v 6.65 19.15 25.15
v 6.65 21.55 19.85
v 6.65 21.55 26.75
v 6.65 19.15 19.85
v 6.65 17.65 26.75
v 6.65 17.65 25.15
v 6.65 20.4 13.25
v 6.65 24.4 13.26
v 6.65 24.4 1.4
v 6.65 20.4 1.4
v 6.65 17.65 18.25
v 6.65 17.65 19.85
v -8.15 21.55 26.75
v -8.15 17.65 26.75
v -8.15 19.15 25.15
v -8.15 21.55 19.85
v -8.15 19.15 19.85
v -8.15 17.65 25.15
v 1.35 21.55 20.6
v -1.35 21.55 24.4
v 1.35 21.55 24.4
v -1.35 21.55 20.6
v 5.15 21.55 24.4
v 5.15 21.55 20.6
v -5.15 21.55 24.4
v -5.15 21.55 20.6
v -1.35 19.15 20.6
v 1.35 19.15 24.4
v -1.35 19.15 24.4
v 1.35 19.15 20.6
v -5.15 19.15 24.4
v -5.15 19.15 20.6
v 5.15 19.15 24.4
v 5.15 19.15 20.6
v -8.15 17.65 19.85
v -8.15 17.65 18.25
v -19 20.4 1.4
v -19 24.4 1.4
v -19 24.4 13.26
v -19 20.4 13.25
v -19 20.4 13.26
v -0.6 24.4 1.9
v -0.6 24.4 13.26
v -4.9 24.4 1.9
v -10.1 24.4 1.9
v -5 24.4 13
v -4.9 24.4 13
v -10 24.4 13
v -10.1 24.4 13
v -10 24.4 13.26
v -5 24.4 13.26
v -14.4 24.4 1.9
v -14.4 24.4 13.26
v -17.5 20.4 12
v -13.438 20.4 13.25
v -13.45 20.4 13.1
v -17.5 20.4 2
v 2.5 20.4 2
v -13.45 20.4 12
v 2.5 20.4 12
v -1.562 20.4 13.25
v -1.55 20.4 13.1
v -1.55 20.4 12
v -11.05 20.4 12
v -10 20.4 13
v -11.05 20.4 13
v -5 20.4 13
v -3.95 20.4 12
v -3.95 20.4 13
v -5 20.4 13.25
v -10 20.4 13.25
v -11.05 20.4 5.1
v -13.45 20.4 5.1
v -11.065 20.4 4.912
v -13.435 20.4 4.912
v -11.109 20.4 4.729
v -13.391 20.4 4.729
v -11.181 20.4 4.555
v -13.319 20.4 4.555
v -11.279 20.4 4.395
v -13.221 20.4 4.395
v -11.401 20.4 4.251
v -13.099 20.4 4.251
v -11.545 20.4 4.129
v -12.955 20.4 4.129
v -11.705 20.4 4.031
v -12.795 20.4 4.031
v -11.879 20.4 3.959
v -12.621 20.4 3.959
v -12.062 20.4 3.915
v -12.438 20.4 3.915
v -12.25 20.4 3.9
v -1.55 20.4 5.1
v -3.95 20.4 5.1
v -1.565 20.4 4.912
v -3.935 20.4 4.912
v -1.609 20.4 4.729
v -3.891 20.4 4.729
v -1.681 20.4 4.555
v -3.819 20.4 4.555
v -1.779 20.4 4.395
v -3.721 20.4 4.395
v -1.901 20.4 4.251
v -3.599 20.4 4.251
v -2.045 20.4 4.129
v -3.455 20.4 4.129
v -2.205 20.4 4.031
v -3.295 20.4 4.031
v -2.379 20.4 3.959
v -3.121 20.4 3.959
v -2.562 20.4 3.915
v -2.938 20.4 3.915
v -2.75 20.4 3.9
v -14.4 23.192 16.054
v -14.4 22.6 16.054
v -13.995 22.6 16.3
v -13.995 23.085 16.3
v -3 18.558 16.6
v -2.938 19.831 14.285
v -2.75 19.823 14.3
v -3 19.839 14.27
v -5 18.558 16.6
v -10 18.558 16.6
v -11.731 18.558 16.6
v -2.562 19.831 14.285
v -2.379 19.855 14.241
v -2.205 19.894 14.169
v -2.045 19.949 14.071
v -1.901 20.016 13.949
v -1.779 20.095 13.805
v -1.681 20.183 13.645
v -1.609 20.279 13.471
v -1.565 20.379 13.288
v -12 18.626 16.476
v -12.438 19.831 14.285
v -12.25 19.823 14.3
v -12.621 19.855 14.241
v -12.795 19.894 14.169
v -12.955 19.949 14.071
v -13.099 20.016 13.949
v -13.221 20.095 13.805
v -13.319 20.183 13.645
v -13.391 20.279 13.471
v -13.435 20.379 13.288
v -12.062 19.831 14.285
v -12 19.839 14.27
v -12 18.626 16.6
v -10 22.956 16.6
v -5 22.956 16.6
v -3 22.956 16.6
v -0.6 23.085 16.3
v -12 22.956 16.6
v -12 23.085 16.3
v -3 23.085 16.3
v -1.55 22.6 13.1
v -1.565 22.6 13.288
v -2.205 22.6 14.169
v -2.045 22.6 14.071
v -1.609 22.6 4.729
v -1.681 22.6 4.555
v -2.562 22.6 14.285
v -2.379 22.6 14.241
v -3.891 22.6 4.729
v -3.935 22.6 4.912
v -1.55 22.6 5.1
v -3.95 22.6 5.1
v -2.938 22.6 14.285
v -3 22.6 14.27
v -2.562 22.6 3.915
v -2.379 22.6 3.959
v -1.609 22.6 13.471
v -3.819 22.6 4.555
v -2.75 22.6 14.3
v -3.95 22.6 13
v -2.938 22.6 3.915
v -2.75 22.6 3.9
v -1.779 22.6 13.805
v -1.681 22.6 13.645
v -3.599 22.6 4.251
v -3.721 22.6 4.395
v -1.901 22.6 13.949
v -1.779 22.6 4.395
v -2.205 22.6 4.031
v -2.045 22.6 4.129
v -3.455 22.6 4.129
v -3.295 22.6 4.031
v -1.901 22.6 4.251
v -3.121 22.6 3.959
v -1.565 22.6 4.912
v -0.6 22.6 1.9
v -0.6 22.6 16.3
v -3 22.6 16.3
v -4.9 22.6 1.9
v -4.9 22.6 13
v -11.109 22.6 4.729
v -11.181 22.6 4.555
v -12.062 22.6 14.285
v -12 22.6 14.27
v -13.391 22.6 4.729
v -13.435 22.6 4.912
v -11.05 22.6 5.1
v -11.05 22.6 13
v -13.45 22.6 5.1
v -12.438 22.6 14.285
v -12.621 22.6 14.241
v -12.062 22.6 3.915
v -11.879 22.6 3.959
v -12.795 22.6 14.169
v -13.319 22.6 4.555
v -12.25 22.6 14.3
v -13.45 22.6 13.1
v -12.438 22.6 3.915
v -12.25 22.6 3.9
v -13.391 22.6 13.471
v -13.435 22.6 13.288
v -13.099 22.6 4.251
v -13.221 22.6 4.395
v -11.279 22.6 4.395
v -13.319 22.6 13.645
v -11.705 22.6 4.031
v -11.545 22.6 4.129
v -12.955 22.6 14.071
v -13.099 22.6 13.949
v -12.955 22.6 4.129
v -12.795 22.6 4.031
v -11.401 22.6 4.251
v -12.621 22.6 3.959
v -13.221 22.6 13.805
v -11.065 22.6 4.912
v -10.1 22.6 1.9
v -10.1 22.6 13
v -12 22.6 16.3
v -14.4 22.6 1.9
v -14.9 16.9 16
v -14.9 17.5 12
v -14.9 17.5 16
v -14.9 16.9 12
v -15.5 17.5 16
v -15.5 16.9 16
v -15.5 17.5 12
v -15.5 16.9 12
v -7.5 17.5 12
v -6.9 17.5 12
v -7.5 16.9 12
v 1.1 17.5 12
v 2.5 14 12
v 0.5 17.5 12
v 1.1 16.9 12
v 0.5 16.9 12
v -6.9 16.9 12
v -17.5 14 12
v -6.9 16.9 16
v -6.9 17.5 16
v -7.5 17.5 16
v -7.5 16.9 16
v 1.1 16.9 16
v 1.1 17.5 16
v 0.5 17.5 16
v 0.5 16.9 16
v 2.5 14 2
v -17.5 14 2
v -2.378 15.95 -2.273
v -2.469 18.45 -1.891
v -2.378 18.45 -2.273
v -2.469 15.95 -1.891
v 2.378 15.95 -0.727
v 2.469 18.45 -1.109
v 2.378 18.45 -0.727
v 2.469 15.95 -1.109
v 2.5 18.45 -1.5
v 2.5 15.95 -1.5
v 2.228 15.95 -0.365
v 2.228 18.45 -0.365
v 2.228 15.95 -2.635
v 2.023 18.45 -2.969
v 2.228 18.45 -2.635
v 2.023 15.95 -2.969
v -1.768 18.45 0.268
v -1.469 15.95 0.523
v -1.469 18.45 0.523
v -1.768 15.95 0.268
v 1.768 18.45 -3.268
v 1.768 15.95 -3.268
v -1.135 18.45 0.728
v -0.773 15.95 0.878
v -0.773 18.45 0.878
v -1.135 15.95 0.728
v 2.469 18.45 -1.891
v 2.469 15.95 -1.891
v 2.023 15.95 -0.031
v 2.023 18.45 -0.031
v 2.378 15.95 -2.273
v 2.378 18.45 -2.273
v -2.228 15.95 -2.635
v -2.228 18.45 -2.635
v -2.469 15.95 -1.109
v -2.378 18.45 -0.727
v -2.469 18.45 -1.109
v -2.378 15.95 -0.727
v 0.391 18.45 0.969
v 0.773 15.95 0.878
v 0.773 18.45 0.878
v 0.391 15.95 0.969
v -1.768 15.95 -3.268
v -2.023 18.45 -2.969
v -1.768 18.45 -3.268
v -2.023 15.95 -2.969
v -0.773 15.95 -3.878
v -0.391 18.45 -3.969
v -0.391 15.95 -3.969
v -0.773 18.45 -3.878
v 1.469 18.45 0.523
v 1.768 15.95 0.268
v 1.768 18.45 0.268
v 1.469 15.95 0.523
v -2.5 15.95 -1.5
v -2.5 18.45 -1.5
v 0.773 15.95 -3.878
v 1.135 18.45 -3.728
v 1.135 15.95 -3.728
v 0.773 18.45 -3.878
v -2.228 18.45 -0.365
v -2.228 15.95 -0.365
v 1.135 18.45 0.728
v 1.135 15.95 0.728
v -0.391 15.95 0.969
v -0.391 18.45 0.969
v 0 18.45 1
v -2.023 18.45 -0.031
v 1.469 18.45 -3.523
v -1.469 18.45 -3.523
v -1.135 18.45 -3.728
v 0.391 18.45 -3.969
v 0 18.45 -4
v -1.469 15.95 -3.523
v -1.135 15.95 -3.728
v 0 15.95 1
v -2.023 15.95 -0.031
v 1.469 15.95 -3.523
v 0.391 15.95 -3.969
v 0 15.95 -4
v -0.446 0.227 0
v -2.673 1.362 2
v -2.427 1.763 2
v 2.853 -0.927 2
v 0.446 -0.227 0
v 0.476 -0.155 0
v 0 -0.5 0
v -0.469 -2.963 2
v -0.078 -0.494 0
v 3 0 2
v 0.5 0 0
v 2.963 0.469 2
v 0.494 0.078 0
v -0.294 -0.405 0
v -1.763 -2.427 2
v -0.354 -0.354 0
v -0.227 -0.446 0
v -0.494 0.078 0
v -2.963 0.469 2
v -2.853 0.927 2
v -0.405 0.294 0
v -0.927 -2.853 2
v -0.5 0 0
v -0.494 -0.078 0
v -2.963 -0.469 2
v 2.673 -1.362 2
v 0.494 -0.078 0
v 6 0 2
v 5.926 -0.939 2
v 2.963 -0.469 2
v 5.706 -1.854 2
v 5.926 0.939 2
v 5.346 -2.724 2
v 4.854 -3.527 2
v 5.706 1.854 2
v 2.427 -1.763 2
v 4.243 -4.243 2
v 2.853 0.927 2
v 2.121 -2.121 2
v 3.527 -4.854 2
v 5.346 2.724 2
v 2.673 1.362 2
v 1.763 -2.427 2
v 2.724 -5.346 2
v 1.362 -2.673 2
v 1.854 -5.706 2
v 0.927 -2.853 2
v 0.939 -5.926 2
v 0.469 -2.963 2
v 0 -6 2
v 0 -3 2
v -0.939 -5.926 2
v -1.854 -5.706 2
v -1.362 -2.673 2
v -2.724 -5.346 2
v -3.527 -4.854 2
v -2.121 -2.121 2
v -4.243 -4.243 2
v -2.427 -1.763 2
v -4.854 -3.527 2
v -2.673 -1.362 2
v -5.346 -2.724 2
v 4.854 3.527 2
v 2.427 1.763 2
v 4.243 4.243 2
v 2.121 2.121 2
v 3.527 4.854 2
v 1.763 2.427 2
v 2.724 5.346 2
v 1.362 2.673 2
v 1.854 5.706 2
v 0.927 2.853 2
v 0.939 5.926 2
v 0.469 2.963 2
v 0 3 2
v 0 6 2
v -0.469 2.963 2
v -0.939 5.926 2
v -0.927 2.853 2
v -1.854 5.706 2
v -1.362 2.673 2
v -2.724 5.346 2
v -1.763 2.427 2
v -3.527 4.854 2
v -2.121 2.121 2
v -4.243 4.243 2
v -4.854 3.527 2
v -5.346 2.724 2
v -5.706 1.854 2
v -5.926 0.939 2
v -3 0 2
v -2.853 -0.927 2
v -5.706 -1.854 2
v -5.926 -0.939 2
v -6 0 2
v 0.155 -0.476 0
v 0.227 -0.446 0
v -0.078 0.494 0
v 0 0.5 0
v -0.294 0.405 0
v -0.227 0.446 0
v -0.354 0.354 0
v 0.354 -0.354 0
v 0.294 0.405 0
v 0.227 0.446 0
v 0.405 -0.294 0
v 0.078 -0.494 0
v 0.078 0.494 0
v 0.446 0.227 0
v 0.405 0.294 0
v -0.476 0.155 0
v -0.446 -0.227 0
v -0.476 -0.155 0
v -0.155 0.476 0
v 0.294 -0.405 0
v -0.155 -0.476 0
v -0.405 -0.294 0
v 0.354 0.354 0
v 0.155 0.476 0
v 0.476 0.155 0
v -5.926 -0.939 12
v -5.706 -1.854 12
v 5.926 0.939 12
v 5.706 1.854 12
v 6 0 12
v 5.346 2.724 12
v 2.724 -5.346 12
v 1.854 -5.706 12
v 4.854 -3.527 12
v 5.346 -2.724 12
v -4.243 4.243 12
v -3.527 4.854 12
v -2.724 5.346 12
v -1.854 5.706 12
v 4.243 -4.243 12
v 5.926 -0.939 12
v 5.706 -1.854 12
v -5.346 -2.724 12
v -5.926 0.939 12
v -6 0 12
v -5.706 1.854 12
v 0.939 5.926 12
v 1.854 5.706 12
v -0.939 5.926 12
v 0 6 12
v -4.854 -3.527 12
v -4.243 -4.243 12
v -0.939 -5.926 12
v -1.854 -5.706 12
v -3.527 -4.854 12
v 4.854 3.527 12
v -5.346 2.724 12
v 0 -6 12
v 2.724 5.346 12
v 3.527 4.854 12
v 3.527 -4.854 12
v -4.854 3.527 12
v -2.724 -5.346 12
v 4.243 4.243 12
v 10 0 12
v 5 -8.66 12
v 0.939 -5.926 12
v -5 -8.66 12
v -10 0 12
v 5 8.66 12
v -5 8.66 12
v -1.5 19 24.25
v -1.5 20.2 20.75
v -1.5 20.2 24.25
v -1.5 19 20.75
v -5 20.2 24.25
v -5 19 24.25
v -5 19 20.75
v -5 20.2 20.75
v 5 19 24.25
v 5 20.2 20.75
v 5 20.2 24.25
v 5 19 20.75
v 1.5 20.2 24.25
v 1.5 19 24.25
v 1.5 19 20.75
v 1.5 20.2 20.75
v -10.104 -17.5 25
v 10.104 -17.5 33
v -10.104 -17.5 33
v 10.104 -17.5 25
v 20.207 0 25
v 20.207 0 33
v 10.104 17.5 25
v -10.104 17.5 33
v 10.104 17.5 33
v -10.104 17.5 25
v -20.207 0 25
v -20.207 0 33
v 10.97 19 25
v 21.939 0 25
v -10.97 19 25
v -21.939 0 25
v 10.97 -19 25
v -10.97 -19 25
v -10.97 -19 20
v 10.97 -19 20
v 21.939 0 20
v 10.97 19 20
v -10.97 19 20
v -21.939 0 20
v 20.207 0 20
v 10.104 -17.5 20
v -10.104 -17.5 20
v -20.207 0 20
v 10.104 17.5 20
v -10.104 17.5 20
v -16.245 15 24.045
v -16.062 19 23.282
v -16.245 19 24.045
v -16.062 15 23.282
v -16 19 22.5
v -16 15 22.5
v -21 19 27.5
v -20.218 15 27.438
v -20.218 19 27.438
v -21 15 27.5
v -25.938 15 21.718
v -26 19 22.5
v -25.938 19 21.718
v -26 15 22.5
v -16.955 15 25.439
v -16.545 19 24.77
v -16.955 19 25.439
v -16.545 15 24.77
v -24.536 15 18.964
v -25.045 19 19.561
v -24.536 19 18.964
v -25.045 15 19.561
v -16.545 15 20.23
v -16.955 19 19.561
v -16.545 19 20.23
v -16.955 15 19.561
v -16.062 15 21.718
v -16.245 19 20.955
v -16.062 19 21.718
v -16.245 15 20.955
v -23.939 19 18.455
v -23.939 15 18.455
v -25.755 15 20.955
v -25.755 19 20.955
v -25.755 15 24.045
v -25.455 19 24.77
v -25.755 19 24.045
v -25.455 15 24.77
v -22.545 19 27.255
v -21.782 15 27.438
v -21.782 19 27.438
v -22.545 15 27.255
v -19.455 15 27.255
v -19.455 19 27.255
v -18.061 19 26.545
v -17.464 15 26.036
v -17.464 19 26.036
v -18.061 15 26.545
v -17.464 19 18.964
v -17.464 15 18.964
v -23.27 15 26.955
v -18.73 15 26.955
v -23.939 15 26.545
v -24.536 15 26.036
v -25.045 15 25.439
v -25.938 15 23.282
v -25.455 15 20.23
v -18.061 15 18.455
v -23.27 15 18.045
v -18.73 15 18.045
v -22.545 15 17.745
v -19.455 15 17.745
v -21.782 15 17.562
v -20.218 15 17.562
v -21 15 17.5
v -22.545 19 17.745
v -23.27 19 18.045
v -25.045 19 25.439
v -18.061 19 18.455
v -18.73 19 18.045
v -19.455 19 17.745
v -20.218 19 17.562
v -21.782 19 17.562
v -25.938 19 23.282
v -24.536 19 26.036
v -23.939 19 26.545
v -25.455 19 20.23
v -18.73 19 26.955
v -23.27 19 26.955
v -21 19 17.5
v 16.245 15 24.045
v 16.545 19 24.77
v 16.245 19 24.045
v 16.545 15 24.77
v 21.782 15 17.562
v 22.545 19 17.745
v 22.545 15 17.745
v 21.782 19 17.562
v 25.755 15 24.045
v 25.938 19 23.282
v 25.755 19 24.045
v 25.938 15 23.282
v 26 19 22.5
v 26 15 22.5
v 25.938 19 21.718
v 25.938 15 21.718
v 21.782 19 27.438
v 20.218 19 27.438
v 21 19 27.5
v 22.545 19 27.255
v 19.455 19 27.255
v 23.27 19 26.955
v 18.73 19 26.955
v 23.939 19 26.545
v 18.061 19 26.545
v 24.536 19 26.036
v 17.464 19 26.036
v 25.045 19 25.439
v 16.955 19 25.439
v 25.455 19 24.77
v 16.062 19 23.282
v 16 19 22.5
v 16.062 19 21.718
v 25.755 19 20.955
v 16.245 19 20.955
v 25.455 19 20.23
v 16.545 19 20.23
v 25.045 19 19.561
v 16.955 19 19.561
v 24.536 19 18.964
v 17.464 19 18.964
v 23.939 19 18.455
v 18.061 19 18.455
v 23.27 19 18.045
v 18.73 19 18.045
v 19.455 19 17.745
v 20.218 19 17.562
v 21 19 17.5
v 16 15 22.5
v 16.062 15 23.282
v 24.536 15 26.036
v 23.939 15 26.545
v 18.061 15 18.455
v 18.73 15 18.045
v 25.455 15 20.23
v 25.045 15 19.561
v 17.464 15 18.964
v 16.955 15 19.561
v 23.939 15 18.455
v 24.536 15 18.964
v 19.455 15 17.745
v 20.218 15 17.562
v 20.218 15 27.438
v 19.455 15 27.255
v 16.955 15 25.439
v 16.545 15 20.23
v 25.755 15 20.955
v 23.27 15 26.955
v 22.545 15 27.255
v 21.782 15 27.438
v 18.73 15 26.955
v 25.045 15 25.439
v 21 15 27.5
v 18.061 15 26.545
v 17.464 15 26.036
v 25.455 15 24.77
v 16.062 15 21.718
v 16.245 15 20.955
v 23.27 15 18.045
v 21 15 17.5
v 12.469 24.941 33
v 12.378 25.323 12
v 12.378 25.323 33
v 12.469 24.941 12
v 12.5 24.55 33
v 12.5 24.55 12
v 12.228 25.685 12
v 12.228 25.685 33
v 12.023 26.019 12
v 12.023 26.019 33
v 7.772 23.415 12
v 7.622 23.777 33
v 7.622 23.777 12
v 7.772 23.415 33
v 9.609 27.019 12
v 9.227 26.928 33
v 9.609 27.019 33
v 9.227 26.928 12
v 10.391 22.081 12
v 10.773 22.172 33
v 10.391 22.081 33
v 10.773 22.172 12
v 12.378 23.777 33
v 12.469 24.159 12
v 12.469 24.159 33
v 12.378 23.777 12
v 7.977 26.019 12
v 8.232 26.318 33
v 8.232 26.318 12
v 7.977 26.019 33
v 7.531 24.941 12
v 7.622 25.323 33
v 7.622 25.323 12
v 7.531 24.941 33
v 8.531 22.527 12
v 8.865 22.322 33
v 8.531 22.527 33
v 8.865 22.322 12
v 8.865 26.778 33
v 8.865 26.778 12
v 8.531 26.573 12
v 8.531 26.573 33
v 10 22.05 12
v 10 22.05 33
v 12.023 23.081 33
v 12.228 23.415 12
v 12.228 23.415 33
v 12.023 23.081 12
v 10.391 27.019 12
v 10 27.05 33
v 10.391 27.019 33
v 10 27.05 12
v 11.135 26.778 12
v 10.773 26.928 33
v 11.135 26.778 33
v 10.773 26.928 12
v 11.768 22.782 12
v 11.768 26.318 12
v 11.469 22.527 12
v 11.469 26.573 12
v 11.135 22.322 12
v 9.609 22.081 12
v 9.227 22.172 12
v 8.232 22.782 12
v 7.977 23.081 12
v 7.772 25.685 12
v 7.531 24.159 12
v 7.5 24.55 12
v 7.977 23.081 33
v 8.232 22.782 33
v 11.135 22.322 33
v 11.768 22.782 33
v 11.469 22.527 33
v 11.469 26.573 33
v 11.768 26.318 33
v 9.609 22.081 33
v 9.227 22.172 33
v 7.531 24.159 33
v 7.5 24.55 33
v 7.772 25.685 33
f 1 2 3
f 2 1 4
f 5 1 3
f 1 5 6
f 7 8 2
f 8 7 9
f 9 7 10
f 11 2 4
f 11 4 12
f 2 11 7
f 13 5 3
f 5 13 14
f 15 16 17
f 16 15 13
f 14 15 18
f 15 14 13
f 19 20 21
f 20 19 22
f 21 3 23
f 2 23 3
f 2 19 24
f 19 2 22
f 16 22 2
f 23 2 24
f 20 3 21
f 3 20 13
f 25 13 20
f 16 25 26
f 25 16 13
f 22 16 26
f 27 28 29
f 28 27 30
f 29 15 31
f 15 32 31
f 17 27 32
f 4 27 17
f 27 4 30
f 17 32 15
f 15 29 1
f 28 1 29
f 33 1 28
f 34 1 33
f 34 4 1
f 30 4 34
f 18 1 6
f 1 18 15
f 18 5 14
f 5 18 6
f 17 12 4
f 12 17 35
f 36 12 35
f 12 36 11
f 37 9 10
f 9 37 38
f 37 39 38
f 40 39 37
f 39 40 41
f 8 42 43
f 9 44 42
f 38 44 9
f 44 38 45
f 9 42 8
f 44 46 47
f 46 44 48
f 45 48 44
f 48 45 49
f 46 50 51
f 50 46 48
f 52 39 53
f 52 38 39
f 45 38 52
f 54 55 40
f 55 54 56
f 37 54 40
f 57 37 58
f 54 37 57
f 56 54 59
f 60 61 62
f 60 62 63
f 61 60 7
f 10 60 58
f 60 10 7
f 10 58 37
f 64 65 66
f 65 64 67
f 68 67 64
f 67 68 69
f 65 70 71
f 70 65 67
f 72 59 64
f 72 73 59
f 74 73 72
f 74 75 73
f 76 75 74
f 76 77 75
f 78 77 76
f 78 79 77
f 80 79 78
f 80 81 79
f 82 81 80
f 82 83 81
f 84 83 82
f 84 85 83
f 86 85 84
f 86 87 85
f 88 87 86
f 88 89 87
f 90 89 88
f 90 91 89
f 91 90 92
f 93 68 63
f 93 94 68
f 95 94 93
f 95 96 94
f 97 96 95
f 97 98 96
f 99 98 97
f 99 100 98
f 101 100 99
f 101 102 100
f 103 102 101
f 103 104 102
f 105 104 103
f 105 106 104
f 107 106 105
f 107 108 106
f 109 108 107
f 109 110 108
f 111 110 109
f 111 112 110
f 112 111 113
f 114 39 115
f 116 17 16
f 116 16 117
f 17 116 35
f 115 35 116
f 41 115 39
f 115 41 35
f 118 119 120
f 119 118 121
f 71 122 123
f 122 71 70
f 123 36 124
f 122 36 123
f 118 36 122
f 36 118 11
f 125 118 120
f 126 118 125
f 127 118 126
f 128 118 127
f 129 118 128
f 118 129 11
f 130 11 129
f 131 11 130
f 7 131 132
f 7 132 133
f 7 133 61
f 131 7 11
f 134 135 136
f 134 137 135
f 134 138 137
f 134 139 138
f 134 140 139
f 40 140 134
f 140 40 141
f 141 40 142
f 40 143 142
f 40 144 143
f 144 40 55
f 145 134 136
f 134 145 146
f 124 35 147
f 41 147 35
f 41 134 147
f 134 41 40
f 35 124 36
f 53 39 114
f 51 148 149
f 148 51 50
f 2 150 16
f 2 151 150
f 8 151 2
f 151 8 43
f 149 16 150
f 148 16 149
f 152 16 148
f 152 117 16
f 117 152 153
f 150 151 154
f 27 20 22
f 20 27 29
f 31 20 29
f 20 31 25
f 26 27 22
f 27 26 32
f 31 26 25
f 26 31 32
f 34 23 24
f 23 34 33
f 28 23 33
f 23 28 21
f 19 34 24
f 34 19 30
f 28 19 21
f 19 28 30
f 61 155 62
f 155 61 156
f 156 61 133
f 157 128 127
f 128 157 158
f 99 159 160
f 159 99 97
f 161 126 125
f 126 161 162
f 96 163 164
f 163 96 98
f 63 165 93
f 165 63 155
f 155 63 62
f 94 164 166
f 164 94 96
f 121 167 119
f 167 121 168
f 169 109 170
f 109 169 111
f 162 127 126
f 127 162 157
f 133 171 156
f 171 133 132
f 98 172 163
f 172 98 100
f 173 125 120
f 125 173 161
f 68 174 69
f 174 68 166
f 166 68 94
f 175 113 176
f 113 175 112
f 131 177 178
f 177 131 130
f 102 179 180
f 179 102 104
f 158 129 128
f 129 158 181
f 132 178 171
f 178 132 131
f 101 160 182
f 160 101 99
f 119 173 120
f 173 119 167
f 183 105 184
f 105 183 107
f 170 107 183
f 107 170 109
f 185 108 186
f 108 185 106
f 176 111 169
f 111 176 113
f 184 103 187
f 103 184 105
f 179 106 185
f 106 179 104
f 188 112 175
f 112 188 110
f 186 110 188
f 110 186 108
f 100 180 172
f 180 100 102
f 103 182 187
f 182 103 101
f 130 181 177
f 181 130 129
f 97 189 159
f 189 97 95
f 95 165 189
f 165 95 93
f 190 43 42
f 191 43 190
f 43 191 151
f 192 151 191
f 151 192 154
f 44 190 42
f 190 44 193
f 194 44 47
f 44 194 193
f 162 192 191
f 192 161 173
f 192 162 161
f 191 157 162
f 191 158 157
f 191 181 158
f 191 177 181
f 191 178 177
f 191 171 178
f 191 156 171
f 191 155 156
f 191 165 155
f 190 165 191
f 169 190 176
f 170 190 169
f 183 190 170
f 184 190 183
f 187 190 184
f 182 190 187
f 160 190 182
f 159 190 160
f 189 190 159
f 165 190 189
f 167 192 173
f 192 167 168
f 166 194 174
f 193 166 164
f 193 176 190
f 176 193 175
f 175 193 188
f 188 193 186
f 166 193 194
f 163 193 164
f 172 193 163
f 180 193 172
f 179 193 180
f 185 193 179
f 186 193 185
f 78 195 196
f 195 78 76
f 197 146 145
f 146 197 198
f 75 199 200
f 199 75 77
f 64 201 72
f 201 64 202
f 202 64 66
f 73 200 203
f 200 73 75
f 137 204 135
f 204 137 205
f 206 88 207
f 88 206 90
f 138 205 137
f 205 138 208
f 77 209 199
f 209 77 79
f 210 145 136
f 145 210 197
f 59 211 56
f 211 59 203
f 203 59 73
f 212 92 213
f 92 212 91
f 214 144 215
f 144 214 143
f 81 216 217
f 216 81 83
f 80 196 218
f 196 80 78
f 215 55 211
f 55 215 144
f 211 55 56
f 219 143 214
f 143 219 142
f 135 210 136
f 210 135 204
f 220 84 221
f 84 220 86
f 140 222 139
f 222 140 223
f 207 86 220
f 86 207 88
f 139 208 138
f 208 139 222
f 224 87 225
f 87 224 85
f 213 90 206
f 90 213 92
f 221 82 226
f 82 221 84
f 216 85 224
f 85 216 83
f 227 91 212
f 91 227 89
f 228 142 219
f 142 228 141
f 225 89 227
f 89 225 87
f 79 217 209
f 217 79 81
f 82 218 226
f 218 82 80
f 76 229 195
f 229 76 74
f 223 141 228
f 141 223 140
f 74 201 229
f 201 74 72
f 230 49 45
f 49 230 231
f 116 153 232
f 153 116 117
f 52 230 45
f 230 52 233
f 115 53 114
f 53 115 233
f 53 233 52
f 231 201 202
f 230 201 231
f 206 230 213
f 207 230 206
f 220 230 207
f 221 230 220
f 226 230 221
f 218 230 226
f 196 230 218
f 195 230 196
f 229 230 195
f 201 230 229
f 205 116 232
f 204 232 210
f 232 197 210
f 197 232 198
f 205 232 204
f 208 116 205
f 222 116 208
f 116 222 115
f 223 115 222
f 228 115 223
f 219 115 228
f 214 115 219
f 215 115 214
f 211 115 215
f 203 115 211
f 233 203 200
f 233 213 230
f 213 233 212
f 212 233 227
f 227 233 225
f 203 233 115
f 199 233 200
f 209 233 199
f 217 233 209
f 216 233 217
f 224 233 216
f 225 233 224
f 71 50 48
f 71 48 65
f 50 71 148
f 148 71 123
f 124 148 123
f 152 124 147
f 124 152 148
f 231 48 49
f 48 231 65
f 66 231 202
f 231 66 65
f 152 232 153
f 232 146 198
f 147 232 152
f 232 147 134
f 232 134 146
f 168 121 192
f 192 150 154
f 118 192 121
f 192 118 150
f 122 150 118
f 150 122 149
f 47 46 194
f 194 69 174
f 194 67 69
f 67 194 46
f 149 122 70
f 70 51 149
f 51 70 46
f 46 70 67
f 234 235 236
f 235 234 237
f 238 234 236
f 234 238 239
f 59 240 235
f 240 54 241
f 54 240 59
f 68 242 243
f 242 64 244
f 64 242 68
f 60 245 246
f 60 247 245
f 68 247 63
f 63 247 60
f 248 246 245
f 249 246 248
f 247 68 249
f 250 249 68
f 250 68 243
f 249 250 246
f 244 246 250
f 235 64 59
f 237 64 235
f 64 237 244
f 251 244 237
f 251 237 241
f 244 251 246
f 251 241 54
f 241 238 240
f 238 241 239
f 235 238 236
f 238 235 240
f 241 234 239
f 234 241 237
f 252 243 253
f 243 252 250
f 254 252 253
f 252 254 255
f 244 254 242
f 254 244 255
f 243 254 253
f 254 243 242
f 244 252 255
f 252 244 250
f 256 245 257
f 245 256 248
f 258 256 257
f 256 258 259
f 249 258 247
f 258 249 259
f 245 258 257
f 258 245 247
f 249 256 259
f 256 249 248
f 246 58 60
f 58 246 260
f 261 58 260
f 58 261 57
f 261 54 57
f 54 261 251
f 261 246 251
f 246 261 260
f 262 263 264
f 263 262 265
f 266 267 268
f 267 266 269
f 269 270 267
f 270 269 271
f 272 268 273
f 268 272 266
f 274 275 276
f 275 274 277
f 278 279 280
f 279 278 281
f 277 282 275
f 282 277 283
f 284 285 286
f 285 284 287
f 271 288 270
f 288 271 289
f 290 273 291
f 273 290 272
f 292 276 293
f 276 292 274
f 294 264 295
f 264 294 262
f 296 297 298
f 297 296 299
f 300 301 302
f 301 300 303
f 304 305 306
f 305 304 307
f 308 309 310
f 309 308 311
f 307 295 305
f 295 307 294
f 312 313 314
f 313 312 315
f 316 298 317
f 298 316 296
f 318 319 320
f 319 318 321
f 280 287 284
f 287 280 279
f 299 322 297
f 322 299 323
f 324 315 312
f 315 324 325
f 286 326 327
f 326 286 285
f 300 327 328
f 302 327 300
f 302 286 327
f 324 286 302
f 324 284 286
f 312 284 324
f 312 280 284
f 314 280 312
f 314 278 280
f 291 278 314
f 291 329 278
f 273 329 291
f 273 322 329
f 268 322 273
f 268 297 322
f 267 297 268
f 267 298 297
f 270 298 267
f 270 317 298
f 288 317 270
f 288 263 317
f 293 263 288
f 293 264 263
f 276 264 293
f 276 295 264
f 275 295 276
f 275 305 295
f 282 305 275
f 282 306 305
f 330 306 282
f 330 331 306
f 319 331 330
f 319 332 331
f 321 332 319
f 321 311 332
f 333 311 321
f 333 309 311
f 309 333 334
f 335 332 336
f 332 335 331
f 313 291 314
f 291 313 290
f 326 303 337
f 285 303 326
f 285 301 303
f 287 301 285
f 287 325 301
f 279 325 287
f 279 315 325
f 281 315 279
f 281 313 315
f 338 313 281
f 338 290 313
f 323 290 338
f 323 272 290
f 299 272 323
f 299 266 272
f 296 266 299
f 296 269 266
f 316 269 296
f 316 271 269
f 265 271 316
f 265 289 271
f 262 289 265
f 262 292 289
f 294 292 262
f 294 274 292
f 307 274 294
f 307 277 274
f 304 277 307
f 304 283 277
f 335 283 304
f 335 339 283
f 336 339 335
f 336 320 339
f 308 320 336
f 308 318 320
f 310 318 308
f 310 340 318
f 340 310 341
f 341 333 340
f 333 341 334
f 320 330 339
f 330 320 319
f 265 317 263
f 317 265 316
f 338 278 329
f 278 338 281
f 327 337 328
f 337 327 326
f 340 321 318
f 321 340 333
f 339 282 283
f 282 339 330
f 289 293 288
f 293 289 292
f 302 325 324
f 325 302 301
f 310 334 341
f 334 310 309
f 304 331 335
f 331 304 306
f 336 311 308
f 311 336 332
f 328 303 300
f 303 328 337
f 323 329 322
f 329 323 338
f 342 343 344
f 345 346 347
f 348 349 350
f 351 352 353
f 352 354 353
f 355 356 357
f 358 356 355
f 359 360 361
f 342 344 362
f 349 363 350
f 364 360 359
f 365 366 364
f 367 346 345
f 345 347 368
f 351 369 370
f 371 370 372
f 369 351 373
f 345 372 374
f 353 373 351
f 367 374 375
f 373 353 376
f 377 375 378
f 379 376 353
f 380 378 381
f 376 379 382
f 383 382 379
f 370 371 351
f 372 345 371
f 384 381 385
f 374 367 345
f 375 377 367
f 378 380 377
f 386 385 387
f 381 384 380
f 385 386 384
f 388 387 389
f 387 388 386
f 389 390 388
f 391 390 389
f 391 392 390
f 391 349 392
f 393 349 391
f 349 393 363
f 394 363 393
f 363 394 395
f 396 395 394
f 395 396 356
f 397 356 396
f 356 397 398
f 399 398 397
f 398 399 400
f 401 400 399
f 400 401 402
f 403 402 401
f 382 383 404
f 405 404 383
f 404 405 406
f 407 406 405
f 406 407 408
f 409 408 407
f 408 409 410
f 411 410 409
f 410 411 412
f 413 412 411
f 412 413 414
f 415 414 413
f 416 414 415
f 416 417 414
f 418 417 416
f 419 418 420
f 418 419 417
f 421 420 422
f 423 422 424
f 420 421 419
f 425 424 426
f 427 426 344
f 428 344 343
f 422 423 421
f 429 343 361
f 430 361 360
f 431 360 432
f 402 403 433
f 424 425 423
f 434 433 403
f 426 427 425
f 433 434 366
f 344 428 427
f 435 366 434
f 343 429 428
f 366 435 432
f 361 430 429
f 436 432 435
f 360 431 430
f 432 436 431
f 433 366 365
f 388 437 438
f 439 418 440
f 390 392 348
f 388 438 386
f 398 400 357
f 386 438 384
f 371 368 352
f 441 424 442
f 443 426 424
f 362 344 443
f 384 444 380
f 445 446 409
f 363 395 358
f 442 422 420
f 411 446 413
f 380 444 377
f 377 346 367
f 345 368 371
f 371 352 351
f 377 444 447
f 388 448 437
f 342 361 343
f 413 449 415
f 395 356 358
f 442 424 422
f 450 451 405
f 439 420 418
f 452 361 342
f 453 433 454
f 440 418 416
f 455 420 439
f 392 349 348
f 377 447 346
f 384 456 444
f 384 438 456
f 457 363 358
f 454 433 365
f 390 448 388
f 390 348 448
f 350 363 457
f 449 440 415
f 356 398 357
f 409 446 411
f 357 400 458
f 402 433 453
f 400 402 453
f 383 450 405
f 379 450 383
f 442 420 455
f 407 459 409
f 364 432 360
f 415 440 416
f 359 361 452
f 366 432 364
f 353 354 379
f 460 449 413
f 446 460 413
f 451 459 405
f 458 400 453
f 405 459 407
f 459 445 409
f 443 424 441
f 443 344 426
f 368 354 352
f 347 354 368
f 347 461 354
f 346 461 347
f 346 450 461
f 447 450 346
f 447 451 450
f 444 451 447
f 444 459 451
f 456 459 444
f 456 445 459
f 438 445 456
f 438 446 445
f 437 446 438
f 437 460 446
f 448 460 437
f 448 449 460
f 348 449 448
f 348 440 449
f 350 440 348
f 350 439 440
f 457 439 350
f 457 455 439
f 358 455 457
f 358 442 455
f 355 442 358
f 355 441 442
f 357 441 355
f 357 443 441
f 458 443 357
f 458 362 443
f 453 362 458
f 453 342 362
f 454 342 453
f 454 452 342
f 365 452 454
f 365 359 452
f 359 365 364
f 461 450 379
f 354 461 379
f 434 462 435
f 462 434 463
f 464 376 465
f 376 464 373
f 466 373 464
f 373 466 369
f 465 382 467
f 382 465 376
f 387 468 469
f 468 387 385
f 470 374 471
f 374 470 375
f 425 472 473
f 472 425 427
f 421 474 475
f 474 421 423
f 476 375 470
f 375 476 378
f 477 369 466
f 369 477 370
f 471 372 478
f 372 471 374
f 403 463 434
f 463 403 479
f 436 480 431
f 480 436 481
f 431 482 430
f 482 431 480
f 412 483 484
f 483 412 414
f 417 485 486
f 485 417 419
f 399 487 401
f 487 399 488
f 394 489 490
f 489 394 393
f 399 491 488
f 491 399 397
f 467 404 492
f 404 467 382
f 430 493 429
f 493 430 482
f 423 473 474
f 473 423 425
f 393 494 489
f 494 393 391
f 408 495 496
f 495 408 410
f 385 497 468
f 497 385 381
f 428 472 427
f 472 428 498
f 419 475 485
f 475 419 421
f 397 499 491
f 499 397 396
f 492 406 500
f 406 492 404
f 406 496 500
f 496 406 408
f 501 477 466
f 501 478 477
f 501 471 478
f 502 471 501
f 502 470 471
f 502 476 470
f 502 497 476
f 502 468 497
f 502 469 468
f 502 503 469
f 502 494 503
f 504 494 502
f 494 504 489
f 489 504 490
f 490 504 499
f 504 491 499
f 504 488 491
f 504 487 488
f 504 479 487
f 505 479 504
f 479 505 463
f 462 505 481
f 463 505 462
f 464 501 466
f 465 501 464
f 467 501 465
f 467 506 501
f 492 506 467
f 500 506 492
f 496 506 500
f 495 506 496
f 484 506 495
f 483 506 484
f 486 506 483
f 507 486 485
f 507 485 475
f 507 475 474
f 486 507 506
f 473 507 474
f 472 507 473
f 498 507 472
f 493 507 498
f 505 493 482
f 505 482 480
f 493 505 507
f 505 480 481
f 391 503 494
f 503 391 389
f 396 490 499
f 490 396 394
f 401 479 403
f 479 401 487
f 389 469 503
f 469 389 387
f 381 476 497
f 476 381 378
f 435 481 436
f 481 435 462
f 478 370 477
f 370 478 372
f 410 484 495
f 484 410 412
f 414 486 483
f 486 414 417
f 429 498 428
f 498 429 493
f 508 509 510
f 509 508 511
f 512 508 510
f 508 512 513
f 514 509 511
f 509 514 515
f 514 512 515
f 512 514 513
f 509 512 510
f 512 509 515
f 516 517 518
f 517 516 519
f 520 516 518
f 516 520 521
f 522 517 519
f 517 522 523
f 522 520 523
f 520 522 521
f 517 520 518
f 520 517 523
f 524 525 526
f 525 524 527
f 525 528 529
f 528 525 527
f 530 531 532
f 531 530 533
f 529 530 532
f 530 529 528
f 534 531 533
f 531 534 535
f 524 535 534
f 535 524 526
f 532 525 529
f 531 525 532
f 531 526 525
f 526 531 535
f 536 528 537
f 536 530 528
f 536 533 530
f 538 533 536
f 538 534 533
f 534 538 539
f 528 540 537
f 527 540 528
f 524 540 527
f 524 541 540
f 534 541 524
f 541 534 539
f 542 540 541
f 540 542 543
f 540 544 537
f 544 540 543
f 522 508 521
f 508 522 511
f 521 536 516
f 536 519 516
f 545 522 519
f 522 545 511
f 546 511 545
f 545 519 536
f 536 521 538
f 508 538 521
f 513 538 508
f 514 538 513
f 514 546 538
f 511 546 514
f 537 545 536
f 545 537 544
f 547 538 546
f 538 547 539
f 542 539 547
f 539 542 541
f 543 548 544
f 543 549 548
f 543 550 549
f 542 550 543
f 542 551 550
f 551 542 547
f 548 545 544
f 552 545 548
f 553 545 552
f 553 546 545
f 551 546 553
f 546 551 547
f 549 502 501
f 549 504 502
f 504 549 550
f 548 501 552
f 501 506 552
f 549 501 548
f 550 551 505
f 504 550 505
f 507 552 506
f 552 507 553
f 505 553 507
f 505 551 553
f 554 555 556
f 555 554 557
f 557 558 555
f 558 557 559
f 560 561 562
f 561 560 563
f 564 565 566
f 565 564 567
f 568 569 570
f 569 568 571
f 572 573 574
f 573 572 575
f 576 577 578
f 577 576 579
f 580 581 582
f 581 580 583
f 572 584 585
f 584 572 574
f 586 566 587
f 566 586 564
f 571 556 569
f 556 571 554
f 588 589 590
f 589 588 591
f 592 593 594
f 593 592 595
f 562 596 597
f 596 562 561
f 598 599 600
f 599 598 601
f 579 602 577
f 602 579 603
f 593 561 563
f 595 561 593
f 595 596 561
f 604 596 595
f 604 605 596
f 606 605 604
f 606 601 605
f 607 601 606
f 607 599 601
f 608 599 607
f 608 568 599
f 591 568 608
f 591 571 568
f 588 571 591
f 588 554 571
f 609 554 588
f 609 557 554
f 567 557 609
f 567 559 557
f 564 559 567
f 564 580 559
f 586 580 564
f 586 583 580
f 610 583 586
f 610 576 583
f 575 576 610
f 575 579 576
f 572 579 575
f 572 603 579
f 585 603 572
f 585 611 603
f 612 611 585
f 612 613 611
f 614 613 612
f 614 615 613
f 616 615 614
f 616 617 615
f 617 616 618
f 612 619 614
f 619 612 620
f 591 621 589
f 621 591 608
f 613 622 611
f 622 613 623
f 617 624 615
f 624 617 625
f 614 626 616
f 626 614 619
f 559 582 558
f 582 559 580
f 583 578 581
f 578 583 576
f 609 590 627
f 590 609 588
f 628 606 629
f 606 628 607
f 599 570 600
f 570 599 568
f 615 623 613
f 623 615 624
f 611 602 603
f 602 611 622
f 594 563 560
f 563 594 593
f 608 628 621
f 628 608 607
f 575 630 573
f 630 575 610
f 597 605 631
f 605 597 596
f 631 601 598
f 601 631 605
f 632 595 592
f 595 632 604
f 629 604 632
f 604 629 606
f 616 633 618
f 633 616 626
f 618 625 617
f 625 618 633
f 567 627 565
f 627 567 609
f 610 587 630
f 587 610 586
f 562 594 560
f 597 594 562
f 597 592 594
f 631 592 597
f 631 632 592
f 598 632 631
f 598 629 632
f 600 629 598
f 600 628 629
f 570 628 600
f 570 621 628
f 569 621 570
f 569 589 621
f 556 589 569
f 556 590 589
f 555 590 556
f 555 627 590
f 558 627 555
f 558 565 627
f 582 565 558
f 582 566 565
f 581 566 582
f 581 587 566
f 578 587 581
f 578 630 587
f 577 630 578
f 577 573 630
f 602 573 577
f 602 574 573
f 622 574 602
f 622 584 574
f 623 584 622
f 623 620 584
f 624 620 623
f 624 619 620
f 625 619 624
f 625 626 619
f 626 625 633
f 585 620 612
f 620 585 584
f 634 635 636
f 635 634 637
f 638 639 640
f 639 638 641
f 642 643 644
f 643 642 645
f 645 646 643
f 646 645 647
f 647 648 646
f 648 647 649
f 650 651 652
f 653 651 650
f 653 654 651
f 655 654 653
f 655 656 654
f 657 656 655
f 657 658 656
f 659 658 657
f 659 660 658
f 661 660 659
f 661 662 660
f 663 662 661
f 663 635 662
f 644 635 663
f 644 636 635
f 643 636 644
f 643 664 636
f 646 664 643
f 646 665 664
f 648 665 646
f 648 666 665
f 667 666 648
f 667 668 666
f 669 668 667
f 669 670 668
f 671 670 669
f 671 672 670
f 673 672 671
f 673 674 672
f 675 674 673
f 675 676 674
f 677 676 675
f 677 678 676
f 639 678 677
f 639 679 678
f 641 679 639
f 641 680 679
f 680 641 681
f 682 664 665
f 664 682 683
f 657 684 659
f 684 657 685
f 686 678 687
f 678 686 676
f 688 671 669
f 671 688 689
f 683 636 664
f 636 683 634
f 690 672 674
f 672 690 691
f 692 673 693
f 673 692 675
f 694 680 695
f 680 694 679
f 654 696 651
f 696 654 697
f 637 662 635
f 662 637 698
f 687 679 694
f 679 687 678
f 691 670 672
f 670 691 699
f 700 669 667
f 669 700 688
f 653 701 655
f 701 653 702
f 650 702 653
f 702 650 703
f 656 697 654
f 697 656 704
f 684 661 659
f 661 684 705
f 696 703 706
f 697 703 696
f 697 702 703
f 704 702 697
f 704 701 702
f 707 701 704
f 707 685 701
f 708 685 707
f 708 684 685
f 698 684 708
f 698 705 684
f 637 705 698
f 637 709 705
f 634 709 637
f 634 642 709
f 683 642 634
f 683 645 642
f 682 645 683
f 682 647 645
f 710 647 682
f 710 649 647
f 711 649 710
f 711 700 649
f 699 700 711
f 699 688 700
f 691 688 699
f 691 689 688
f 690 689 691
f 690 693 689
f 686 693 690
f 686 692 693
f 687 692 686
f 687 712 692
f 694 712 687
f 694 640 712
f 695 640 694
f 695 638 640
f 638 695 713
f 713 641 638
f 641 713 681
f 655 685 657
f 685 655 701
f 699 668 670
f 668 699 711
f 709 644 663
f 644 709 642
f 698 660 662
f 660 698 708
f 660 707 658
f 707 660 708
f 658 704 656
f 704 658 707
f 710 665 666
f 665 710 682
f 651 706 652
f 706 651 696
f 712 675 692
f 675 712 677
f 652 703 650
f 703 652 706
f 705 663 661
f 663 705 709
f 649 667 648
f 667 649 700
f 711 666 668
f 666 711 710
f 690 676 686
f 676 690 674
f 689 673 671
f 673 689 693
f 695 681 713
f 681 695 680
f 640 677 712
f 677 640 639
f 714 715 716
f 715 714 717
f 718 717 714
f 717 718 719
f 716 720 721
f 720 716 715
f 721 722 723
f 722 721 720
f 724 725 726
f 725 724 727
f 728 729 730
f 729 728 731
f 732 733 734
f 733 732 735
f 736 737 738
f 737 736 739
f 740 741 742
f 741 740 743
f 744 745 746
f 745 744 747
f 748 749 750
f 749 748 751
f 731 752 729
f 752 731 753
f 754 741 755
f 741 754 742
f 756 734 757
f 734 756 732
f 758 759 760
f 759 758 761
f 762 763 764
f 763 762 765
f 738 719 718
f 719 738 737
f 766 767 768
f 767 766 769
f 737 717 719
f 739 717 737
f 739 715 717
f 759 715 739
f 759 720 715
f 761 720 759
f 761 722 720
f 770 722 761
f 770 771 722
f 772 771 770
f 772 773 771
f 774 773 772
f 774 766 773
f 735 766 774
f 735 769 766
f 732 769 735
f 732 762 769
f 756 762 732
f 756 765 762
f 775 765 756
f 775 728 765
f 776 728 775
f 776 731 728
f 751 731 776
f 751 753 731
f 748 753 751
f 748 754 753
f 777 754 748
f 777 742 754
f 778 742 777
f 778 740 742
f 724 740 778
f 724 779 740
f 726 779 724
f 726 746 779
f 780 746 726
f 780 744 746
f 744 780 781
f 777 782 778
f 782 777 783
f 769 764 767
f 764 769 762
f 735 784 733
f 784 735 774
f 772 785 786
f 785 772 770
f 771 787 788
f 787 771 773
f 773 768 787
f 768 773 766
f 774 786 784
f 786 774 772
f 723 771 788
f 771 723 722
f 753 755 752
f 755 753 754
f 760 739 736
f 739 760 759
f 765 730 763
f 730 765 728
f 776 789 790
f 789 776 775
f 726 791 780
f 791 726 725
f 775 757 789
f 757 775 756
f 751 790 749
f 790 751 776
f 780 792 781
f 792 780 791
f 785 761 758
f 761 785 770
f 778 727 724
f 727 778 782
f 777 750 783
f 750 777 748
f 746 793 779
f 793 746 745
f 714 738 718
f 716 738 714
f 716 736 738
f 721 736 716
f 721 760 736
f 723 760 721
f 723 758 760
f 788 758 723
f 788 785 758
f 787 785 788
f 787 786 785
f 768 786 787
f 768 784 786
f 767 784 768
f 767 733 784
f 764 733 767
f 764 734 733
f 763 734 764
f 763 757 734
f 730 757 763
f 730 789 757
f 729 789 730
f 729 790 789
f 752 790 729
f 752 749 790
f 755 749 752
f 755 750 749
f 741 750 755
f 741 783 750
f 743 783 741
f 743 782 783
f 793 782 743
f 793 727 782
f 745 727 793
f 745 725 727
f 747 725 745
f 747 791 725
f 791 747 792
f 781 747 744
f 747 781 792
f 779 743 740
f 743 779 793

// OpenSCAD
// Removable Z-probe bracket for the BIQU Magician (Steren SS0505A roller-lever microswitch).
//
// Two ways to mount it:
//   "clip": a saddle that pushes onto the raised band around the effector. Lips sit over and under
//           the band, and two windows drop over the two small square lugs on it (the OEM snap point
//           for a shroud), so it can't slide sideways. Nothing to drill, pulls straight off.
//   "fan":  a tab clamped under one existing M3 fan screw, with two lips hugging the corner of
//           the fan frame so it can't swing around the screw.
// Both carry the same plate: the switch is held by two M2 screws in vertical slots, so the roller
// height can be set 3-5 mm below the nozzle tip.
//
// Coordinates (all mm). Origin = nozzle tip.
//   +Y = straight out from the nozzle, through the middle of the effector face that carries the lugs
//   +Z = up
//   +X = along that face (clockwise seen from above)
//
// Every dimension marked GUESS was estimated from photos. Measure it (see README.md) and edit it here.
// Render one part: openscad -D 'part="clip"' -o probe_mount_clip.stl probe_mount.scad
//   part = "assembly" | "assembly_fan" | "clip" | "fan" | "test"

part = "assembly";

/* ---------- Switch: Steren SS0505A (subminiature roller lever) ---------- */
sw_l          = 20;    // body length (along X)
sw_h          = 10;    // body height, terminal face to lever face
sw_t          = 6.4;   // body thickness (along Y)
sw_hole_d     = 2.3;   // mounting hole diameter
sw_hole_pitch = 9.5;   // centre to centre of the two holes
sw_hole_end   = 5.25;  // roller-end of the body to the nearer hole centre ((20-9.5)/2 if centred)
sw_hole_act   = 7.1;   // lever face of the body to the hole centres (GUESS: typical is ~2.9 from the terminal face)
roller_drop   = 6.0;   // lever face to the bottom of the roller, lever at rest (GUESS)
roller_in     = 2.5;   // roller-end of the body to the roller centre, along X (GUESS)
roller_d      = 5.0;   // roller diameter
term_room     = 5.0;   // terminals + solder above the terminal face (wires bend toward the plate)

/* ---------- Where the roller should end up ---------- */
roller_below  = 4;     // roller bottom below the nozzle tip, mid-slot (target 3-5)
roller_x      = 0;     // roller centre along X (0 = straight out from the nozzle)
sw_dir        = -1;    // switch body runs from the roller toward +X (1) or -X (-1); -1 keeps it away from
                       // the hotend cable and rod end that sit on the +X side in the side photo
travel        = 8;     // slot travel, +-4 mm around roller_below
face_angle    = 90;    // direction the lug face points, in printer degrees (tower C/back = 90,
                       // A/front-left = 210, B/front-right = 330). Only used for the offset printout.

/* ---------- Hotend keep-out ---------- */
heater_reach  = 6;     // nozzle axis to the side of the heater block facing the probe (GUESS)
heater_zmin   = 2;     // heater block bottom above the nozzle tip (GUESS)
heater_zmax   = 12;    // heater block top above the nozzle tip (GUESS)
min_clear     = 8;     // required gap, heater block / nozzle to any part of the switch or bracket

/* ---------- The band and lugs on the effector (all GUESS until measured) ---------- */
band_h        = 5.0;   // band height, bottom edge to top edge
band_t        = 1.5;   // how far the band stands proud of the body just above / below it (0 = flush)
band_r        = 19;    // nozzle axis to the band's outer face (level, at the lugs)
band_z0       = 20;    // nozzle tip up to the band's bottom edge
lug_n         = 2;     // number of lugs
lug_w         = 3.5;   // lug width (along X)
lug_pitch     = 6.5;   // lug centre to centre (gap between lugs = pitch - width)
lug_h         = 3.5;   // lug height (along Z)
lug_t         = 1.2;   // how far a lug sticks out from the band face
lug_z0        = 20.75; // lug bottom edge above the nozzle tip (default: centred on the band)
lug_cx        = 0;     // centre of the lug pair along X

/* ---------- Hotend cable (runs down in front of the band on one side) ---------- */
cable_x       = 10;    // cable centre along X where it crosses the band (GUESS; 0 = none)
cable_w       = 5;     // cable width incl. the Kapton wrap

/* ---------- Rod-end (arm joint) keep-out ---------- */
joint_x       = 21;    // X distance from the face centre to each rod-end eye centre (GUESS)
joint_z       = 22.5;  // height of the rod-end eye centres above the nozzle tip (GUESS)
joint_r       = 5;     // rod-end eye radius incl. the washer
joint_clear   = 2;

/* ---------- Saddle (clip) ---------- */
fit           = 0.15;  // clearance per side: lug windows and band height (lower = tighter grip)
front_t       = 2.4;   // front wall over the band face (the lug windows go through it)
lip_t         = 1.6;   // thickness of the lips over and under the band
margin_l      = 3;     // saddle end beyond the lugs on the -X side
margin_r      = 1.5;   // ... and on the +X side (toward the cable / rod end in the photo)

/* ---------- Switch plate ---------- */
plate_t       = 4.0;
plate_margin  = 1.5;   // plate edge beyond the switch body (X)
slot_w        = 2.4;   // M2 clearance slot
nut_af        = 4.0;   // M2 nut across flats (DIN 934 = 4.0)
nut_depth     = 1.8;   // nut groove depth on the outer face (M2 nut is 1.6 thick)
gusset_h      = 5;     // height of the sloped joint between clip and plate (>= overhang keeps it <= 45 deg)
zip_w         = 3.6;   // zip-tie slot length (fits ties up to ~3.5 mm wide)
zip_t         = 2.0;   // zip-tie slot width
zip_pitch     = 7;     // the two zip-tie slots, centre to centre

/* ---------- Fan-screw variant (all GUESS until measured) ---------- */
fan_screw     = [8, 21, 17];  // [x, y, z] of the point where the screw head now sits on the fan frame
fan_tilt      = 30;    // fan face angle from vertical, top leaning toward the nozzle (+)
fan_corner    = 1;     // which side the fan frame's outer corner edge is on, along X (+1 / -1)
fan_edge      = 3.2;   // screw centre to the frame's bottom edge and to its side edge
tab_t         = 2.5;   // tab thickness under the screw head (use a screw ~3 mm longer)
tab_d         = 7.5;   // tab width
m3_slot       = 3.4;   // M3 clearance
m3_slot_len   = 3;     // slot travel along the fan face
lip_h         = 2.0;   // lip depth over the frame edges
lip_w         = 1.6;   // lip thickness
fan_drop      = 4;     // plate top sits this far below the frame's bottom edge

$fn = 40;
eps = 0.01;

/* ---------- Derived ---------- */
row_w    = (lug_n - 1) * lug_pitch + lug_w;
band_z1  = band_z0 + band_h;
clip_x0  = lug_cx - row_w / 2 - fit - margin_l;
clip_x1  = lug_cx + row_w / 2 + fit + margin_r;
clip_y0  = band_r - band_t + fit;            // lip tips (just short of the body above / below the band)
clip_y1  = band_r + fit + front_t;
clip_z0  = band_z0 - fit - lip_t;
clip_z1  = band_z1 + fit + lip_t;
floor_t  = lip_t;

sw_y0    = heater_reach + min_clear;          // switch inner face (toward nozzle)
sw_y1    = sw_y0 + sw_t;
pl_y0    = sw_y1;                             // plate inner face; switch screws onto it
pl_y1    = pl_y0 + plate_t;

roller_z = -roller_below;                     // roller bottom
act_z    = roller_z + roller_drop;            // lever face of the body (facing down)
top_z    = act_z + sw_h;                      // terminal face (facing up)
hole_z   = act_z + sw_hole_act;
x_end    = roller_x - sw_dir * roller_in;     // roller-end of the body
sw_xa    = min(x_end, x_end + sw_dir * sw_l);
sw_xb    = max(x_end, x_end + sw_dir * sw_l);
hole_x   = [x_end + sw_dir * sw_hole_end, x_end + sw_dir * (sw_hole_end + sw_hole_pitch)];

pl_z0    = hole_z - travel / 2 - slot_w / 2 - 2.5;
roller_y = sw_y0 + sw_t / 2;

/* ---------- Checks (printed in the console) ---------- */
function rot(v, a) = [v[0] * cos(a) - v[1] * sin(a), v[0] * sin(a) + v[1] * cos(a)];
// local (+X along the face, +Y out of it) -> printer XY, with the face pointing at face_angle
off = rot([roller_y, -roller_x], face_angle);

echo(str("ROLLER: ", roller_y, " mm out from the nozzle axis, ", roller_x, " mm along the face"));
echo(str("ESTIMATE [probe] x_offset: ", round(off[0] * 10) / 10, "  y_offset: ", round(off[1] * 10) / 10,
         "  (face_angle ", face_angle, "; confirm with the dot method)"));
echo(str("Roller bottom adjustable from ", roller_z - travel / 2, " to ", roller_z + travel / 2, " (nozzle tip = 0)"));
if (pl_z0 < roller_z + travel / 2 + 1)
    echo("WARNING: plate bottom is within 1 mm of the roller at the top of the slot travel");
if (top_z + 1 + zip_w > clip_z0 - 0.5) echo("WARNING: zip-tie slots reach the saddle lip; lower roller_below or raise band_z0");
if (top_z + term_room > clip_z0 - 1 && sw_xb > clip_x0 && sw_xa < clip_x1 && sw_y1 > clip_y0)
    echo("WARNING: switch terminals run into the saddle. Raise band_z0, lower roller_below, or move roller_x");
if (band_t < 0.8) echo("NOTE: band_t is small: the lips barely hook the band, so the lug windows do all the work");
if (lug_t > front_t - 0.4) echo("NOTE: lugs stick out past most of the front wall; consider a thicker front_t");
if (lug_z0 < band_z0 || lug_z0 + lug_h > band_z1) echo("WARNING: lugs are outside the band height; check lug_z0 / band_z0 / band_h");
px0 = min(clip_x0, sw_xa - plate_margin);
px1 = max(clip_x1, sw_xb + plate_margin);
if (cable_x != 0 && ((clip_x1 > cable_x - cable_w / 2 && clip_x0 < cable_x + cable_w / 2) ||
                     (px1 > cable_x - cable_w / 2 && px0 < cable_x + cable_w / 2)))
    echo("WARNING: bracket overlaps the hotend cable. Move it aside with a zip tie, or reduce margin_r / flip sw_dir");
j_in = joint_x - joint_r - joint_clear;          // rod-end eyes start this far out along X
j_lo = joint_z - joint_r - joint_clear;          // ... and this high
if (max(abs(clip_x0), abs(clip_x1)) > j_in && clip_z1 > j_lo)
    echo("WARNING: the clip block reaches a rod-end eye. Check joint_x/joint_z, or reduce margin_l / margin_r");
if (max(abs(px0), abs(px1)) > j_in && clip_z0 - gusset_h > j_lo)
    echo("WARNING: the plate reaches a rod-end eye. Check joint_x/joint_z, or move roller_x / sw_dir");

/* ---------- Parts ---------- */
module rounded_slot(len, w, h) {   // slot along Z, cut through Y
    hull() for (s = [-1, 1]) translate([0, 0, s * (len - w) / 2]) rotate([-90, 0, 0]) cylinder(d = w, h = h);
}

module plate_body(top, x0 = px0, x1 = px1) {
    translate([x0, pl_y0, pl_z0]) cube([x1 - x0, plate_t, top - pl_z0]);
}

module plate_cuts() {
    slot_len = travel + slot_w;
    for (x = hole_x) translate([x, pl_y0 - 1, hole_z]) {
        rounded_slot(slot_len, slot_w, plate_t + 30);                        // M2 slot (also cuts the gusset)
        // nut groove on the outer face, so the nuts can't spin
        translate([-(nut_af + 0.3) / 2, plate_t + 1 - nut_depth, -(slot_len + nut_af) / 2])
            cube([nut_af + 0.3, nut_depth + 30, slot_len + nut_af]);
    }
    // zip-tie slots just above the switch body: tie the two wires flat against the plate
    // (kept below the saddle so they never weaken its lower lip)
    zc = (sw_xa + sw_xb) / 2;
    for (s = [-1, 1]) translate([zc + s * zip_pitch / 2 - zip_t / 2, pl_y0 - 20, top_z + 1])
        cube([zip_t, plate_t + 40, zip_w]);
}

module clip_block() {   // C-shaped saddle seen from the side: upper lip, front wall, lower lip
    translate([clip_x0, band_r + fit, clip_z0]) cube([clip_x1 - clip_x0, front_t, clip_z1 - clip_z0]);
    translate([clip_x0, clip_y0, band_z1 + fit]) cube([clip_x1 - clip_x0, clip_y1 - clip_y0, lip_t]);
    translate([clip_x0, clip_y0, clip_z0]) cube([clip_x1 - clip_x0, clip_y1 - clip_y0, lip_t]);
}

module clip_cuts() {   // a window through the front wall for each lug
    for (i = [0 : lug_n - 1]) {
        x = lug_cx - row_w / 2 + i * lug_pitch;
        translate([x - fit, band_r - 1, lug_z0 - fit]) cube([lug_w + 2 * fit, front_t + fit + 2, lug_h + 2 * fit]);
    }
}

module probe_clip() {
    difference() {
        union() {
            clip_block();
            plate_body(clip_z0 - gusset_h + eps);
            hull() {   // sloped gusset: clip floor down to the plate
                translate([clip_x0, clip_y0, clip_z0]) cube([clip_x1 - clip_x0, clip_y1 - clip_y0, floor_t]);
                translate([px0, pl_y0, clip_z0 - gusset_h]) cube([px1 - px0, plate_t, eps]);
            }
        }
        clip_cuts();
        plate_cuts();
    }
}

// Test piece: just the saddle with a short pull tab, to check the fit on the band and lugs (prints in a few minutes)
module test_clip() {
    difference() {
        union() {
            clip_block();
            translate([clip_x0, band_r + fit, clip_z0 - 6]) cube([clip_x1 - clip_x0, front_t, 6 + eps]); // pull tab
        }
        clip_cuts();
    }
}

// Fan-screw variant
module fan_frame_local() {   // tab in local coords: z = out of the fan face, y = down the face, origin = screw
    difference() {
        union() {
            hull() {
                cylinder(d = tab_d, h = tab_t);
                translate([0, fan_edge + fit + lip_w - tab_d / 2, 0]) cylinder(d = tab_d, h = tab_t);
                translate([fan_corner * (fan_edge + fit + lip_w - tab_d / 2), 0, 0]) cylinder(d = tab_d, h = tab_t);
            }
            // lip along the frame's bottom edge
            translate([-tab_d / 2 + min(0, fan_corner) * (fan_edge + fit + lip_w - tab_d / 2), fan_edge + fit, -lip_h])
                cube([tab_d + abs(fan_edge + fit + lip_w - tab_d / 2), lip_w, lip_h + eps]);
            // lip along the frame's outer side edge
            translate([fan_corner > 0 ? fan_edge + fit : -(fan_edge + fit) - lip_w, -tab_d / 2, -lip_h])
                cube([lip_w, tab_d + fan_edge + fit + lip_w - tab_d / 2, lip_h + eps]);
        }
        hull() for (s = [-1, 1]) translate([0, s * m3_slot_len / 2, -5]) cylinder(d = m3_slot, h = 20);
    }
}

module fan_frame_keepout() {   // the fan frame corner, local coords
    translate([fan_corner > 0 ? -40 : -fan_edge, -40, -40]) cube([40 + fan_edge, 40 + fan_edge, 40]);
}

module fan_tab_placed() {
    translate(fan_screw) rotate([fan_tilt - 90, 0, 0]) fan_frame_local();
}

fan_top = fan_screw[2] - fan_edge * cos(fan_tilt) - fan_drop;

module probe_fan() {
    difference() {
        union() {
            plate_body(fan_top, px0_fan, px1_fan);
            hull() {
                fan_tab_placed();
                translate([px0_fan, pl_y0, fan_top - eps]) cube([px1_fan - px0_fan, plate_t, eps]);
            }
            fan_tab_placed();
        }
        translate(fan_screw) rotate([fan_tilt - 90, 0, 0]) {
            hull() for (s = [-1, 1]) translate([0, s * m3_slot_len / 2, -1]) cylinder(d = m3_slot, h = 30);  // screw
            translate([0, 0, tab_t]) cylinder(d = 7, h = 30);                                               // head room
            fan_frame_keepout();                                                                            // the frame itself
        }
        plate_cuts();
    }
}
px0_fan = min(fan_screw[0] - tab_d, sw_xa - plate_margin);
px1_fan = max(fan_screw[0] + tab_d, sw_xb + plate_margin);

/* ---------- Ghosts for the assembly preview ---------- */
module ghost_switch() {
    color("dimgray") translate([sw_xa, sw_y0, act_z]) cube([sw_l, sw_t, sw_h]);
    color("silver") translate([roller_x, sw_y0 + sw_t / 2, roller_z + roller_d / 2]) rotate([90, 0, 0])
        cylinder(d = roller_d, h = 2.5, center = true);
    color("gold") for (i = [0 : 2]) translate([sw_xa + 2 + i * (sw_l - 4) / 2, sw_y0 + sw_t / 2 - 0.3, top_z]) cube([0.6, 0.6, 4]);
}
module ghost_hotend() {
    color("orange") cylinder(d1 = 1, d2 = 6, h = heater_zmin);                                  // nozzle
    color("orangered", 0.6) translate([0, 0, heater_zmin]) cylinder(r = heater_reach, h = heater_zmax - heater_zmin);
    %translate([0, 0, 0]) cylinder(r = heater_reach + min_clear, h = heater_zmax);              // keep-out
}
module ghost_body() {
    rb = band_r - band_t;
    color("steelblue", 0.35) {
        translate([0, 0, band_z1]) cylinder(r = rb / cos(30), h = 8, $fn = 6);
        translate([0, 0, band_z0]) cylinder(r = band_r / cos(30), h = band_h, $fn = 6);
        translate([0, 0, heater_zmax]) cylinder(r1 = heater_reach + 4, r2 = rb / cos(30), h = band_z0 - heater_zmax, $fn = 6);
        for (i = [0 : lug_n - 1]) translate([lug_cx - row_w / 2 + i * lug_pitch, band_r - 0.5, lug_z0])
            cube([lug_w, lug_t + 0.5, lug_h]);
    }
    color("gray", 0.5) for (s = [-1, 1]) translate([s * joint_x, band_r - 2, joint_z]) rotate([90, 0, 0])
        cylinder(r = joint_r, h = 4, center = true);
    if (cable_x != 0) color("goldenrod", 0.6) translate([cable_x, band_r + fit + front_t + cable_w / 2 + 0.5, heater_zmax])
        cylinder(d = cable_w, h = band_z1 + 8 - heater_zmax);
}

if (part == "clip")              probe_clip();
else if (part == "fan")          probe_fan();
else if (part == "test")         test_clip();
else if (part == "assembly")     { color("deepskyblue") probe_clip(); ghost_switch(); ghost_hotend(); ghost_body(); }
else if (part == "assembly_fan") { color("limegreen") probe_fan(); ghost_switch(); ghost_hotend();
                                   color("black", 0.4) translate(fan_screw) rotate([fan_tilt - 90, 0, 0])
                                       intersection() { fan_frame_keepout(); translate([-20, -20, -8]) cube(40); } }
